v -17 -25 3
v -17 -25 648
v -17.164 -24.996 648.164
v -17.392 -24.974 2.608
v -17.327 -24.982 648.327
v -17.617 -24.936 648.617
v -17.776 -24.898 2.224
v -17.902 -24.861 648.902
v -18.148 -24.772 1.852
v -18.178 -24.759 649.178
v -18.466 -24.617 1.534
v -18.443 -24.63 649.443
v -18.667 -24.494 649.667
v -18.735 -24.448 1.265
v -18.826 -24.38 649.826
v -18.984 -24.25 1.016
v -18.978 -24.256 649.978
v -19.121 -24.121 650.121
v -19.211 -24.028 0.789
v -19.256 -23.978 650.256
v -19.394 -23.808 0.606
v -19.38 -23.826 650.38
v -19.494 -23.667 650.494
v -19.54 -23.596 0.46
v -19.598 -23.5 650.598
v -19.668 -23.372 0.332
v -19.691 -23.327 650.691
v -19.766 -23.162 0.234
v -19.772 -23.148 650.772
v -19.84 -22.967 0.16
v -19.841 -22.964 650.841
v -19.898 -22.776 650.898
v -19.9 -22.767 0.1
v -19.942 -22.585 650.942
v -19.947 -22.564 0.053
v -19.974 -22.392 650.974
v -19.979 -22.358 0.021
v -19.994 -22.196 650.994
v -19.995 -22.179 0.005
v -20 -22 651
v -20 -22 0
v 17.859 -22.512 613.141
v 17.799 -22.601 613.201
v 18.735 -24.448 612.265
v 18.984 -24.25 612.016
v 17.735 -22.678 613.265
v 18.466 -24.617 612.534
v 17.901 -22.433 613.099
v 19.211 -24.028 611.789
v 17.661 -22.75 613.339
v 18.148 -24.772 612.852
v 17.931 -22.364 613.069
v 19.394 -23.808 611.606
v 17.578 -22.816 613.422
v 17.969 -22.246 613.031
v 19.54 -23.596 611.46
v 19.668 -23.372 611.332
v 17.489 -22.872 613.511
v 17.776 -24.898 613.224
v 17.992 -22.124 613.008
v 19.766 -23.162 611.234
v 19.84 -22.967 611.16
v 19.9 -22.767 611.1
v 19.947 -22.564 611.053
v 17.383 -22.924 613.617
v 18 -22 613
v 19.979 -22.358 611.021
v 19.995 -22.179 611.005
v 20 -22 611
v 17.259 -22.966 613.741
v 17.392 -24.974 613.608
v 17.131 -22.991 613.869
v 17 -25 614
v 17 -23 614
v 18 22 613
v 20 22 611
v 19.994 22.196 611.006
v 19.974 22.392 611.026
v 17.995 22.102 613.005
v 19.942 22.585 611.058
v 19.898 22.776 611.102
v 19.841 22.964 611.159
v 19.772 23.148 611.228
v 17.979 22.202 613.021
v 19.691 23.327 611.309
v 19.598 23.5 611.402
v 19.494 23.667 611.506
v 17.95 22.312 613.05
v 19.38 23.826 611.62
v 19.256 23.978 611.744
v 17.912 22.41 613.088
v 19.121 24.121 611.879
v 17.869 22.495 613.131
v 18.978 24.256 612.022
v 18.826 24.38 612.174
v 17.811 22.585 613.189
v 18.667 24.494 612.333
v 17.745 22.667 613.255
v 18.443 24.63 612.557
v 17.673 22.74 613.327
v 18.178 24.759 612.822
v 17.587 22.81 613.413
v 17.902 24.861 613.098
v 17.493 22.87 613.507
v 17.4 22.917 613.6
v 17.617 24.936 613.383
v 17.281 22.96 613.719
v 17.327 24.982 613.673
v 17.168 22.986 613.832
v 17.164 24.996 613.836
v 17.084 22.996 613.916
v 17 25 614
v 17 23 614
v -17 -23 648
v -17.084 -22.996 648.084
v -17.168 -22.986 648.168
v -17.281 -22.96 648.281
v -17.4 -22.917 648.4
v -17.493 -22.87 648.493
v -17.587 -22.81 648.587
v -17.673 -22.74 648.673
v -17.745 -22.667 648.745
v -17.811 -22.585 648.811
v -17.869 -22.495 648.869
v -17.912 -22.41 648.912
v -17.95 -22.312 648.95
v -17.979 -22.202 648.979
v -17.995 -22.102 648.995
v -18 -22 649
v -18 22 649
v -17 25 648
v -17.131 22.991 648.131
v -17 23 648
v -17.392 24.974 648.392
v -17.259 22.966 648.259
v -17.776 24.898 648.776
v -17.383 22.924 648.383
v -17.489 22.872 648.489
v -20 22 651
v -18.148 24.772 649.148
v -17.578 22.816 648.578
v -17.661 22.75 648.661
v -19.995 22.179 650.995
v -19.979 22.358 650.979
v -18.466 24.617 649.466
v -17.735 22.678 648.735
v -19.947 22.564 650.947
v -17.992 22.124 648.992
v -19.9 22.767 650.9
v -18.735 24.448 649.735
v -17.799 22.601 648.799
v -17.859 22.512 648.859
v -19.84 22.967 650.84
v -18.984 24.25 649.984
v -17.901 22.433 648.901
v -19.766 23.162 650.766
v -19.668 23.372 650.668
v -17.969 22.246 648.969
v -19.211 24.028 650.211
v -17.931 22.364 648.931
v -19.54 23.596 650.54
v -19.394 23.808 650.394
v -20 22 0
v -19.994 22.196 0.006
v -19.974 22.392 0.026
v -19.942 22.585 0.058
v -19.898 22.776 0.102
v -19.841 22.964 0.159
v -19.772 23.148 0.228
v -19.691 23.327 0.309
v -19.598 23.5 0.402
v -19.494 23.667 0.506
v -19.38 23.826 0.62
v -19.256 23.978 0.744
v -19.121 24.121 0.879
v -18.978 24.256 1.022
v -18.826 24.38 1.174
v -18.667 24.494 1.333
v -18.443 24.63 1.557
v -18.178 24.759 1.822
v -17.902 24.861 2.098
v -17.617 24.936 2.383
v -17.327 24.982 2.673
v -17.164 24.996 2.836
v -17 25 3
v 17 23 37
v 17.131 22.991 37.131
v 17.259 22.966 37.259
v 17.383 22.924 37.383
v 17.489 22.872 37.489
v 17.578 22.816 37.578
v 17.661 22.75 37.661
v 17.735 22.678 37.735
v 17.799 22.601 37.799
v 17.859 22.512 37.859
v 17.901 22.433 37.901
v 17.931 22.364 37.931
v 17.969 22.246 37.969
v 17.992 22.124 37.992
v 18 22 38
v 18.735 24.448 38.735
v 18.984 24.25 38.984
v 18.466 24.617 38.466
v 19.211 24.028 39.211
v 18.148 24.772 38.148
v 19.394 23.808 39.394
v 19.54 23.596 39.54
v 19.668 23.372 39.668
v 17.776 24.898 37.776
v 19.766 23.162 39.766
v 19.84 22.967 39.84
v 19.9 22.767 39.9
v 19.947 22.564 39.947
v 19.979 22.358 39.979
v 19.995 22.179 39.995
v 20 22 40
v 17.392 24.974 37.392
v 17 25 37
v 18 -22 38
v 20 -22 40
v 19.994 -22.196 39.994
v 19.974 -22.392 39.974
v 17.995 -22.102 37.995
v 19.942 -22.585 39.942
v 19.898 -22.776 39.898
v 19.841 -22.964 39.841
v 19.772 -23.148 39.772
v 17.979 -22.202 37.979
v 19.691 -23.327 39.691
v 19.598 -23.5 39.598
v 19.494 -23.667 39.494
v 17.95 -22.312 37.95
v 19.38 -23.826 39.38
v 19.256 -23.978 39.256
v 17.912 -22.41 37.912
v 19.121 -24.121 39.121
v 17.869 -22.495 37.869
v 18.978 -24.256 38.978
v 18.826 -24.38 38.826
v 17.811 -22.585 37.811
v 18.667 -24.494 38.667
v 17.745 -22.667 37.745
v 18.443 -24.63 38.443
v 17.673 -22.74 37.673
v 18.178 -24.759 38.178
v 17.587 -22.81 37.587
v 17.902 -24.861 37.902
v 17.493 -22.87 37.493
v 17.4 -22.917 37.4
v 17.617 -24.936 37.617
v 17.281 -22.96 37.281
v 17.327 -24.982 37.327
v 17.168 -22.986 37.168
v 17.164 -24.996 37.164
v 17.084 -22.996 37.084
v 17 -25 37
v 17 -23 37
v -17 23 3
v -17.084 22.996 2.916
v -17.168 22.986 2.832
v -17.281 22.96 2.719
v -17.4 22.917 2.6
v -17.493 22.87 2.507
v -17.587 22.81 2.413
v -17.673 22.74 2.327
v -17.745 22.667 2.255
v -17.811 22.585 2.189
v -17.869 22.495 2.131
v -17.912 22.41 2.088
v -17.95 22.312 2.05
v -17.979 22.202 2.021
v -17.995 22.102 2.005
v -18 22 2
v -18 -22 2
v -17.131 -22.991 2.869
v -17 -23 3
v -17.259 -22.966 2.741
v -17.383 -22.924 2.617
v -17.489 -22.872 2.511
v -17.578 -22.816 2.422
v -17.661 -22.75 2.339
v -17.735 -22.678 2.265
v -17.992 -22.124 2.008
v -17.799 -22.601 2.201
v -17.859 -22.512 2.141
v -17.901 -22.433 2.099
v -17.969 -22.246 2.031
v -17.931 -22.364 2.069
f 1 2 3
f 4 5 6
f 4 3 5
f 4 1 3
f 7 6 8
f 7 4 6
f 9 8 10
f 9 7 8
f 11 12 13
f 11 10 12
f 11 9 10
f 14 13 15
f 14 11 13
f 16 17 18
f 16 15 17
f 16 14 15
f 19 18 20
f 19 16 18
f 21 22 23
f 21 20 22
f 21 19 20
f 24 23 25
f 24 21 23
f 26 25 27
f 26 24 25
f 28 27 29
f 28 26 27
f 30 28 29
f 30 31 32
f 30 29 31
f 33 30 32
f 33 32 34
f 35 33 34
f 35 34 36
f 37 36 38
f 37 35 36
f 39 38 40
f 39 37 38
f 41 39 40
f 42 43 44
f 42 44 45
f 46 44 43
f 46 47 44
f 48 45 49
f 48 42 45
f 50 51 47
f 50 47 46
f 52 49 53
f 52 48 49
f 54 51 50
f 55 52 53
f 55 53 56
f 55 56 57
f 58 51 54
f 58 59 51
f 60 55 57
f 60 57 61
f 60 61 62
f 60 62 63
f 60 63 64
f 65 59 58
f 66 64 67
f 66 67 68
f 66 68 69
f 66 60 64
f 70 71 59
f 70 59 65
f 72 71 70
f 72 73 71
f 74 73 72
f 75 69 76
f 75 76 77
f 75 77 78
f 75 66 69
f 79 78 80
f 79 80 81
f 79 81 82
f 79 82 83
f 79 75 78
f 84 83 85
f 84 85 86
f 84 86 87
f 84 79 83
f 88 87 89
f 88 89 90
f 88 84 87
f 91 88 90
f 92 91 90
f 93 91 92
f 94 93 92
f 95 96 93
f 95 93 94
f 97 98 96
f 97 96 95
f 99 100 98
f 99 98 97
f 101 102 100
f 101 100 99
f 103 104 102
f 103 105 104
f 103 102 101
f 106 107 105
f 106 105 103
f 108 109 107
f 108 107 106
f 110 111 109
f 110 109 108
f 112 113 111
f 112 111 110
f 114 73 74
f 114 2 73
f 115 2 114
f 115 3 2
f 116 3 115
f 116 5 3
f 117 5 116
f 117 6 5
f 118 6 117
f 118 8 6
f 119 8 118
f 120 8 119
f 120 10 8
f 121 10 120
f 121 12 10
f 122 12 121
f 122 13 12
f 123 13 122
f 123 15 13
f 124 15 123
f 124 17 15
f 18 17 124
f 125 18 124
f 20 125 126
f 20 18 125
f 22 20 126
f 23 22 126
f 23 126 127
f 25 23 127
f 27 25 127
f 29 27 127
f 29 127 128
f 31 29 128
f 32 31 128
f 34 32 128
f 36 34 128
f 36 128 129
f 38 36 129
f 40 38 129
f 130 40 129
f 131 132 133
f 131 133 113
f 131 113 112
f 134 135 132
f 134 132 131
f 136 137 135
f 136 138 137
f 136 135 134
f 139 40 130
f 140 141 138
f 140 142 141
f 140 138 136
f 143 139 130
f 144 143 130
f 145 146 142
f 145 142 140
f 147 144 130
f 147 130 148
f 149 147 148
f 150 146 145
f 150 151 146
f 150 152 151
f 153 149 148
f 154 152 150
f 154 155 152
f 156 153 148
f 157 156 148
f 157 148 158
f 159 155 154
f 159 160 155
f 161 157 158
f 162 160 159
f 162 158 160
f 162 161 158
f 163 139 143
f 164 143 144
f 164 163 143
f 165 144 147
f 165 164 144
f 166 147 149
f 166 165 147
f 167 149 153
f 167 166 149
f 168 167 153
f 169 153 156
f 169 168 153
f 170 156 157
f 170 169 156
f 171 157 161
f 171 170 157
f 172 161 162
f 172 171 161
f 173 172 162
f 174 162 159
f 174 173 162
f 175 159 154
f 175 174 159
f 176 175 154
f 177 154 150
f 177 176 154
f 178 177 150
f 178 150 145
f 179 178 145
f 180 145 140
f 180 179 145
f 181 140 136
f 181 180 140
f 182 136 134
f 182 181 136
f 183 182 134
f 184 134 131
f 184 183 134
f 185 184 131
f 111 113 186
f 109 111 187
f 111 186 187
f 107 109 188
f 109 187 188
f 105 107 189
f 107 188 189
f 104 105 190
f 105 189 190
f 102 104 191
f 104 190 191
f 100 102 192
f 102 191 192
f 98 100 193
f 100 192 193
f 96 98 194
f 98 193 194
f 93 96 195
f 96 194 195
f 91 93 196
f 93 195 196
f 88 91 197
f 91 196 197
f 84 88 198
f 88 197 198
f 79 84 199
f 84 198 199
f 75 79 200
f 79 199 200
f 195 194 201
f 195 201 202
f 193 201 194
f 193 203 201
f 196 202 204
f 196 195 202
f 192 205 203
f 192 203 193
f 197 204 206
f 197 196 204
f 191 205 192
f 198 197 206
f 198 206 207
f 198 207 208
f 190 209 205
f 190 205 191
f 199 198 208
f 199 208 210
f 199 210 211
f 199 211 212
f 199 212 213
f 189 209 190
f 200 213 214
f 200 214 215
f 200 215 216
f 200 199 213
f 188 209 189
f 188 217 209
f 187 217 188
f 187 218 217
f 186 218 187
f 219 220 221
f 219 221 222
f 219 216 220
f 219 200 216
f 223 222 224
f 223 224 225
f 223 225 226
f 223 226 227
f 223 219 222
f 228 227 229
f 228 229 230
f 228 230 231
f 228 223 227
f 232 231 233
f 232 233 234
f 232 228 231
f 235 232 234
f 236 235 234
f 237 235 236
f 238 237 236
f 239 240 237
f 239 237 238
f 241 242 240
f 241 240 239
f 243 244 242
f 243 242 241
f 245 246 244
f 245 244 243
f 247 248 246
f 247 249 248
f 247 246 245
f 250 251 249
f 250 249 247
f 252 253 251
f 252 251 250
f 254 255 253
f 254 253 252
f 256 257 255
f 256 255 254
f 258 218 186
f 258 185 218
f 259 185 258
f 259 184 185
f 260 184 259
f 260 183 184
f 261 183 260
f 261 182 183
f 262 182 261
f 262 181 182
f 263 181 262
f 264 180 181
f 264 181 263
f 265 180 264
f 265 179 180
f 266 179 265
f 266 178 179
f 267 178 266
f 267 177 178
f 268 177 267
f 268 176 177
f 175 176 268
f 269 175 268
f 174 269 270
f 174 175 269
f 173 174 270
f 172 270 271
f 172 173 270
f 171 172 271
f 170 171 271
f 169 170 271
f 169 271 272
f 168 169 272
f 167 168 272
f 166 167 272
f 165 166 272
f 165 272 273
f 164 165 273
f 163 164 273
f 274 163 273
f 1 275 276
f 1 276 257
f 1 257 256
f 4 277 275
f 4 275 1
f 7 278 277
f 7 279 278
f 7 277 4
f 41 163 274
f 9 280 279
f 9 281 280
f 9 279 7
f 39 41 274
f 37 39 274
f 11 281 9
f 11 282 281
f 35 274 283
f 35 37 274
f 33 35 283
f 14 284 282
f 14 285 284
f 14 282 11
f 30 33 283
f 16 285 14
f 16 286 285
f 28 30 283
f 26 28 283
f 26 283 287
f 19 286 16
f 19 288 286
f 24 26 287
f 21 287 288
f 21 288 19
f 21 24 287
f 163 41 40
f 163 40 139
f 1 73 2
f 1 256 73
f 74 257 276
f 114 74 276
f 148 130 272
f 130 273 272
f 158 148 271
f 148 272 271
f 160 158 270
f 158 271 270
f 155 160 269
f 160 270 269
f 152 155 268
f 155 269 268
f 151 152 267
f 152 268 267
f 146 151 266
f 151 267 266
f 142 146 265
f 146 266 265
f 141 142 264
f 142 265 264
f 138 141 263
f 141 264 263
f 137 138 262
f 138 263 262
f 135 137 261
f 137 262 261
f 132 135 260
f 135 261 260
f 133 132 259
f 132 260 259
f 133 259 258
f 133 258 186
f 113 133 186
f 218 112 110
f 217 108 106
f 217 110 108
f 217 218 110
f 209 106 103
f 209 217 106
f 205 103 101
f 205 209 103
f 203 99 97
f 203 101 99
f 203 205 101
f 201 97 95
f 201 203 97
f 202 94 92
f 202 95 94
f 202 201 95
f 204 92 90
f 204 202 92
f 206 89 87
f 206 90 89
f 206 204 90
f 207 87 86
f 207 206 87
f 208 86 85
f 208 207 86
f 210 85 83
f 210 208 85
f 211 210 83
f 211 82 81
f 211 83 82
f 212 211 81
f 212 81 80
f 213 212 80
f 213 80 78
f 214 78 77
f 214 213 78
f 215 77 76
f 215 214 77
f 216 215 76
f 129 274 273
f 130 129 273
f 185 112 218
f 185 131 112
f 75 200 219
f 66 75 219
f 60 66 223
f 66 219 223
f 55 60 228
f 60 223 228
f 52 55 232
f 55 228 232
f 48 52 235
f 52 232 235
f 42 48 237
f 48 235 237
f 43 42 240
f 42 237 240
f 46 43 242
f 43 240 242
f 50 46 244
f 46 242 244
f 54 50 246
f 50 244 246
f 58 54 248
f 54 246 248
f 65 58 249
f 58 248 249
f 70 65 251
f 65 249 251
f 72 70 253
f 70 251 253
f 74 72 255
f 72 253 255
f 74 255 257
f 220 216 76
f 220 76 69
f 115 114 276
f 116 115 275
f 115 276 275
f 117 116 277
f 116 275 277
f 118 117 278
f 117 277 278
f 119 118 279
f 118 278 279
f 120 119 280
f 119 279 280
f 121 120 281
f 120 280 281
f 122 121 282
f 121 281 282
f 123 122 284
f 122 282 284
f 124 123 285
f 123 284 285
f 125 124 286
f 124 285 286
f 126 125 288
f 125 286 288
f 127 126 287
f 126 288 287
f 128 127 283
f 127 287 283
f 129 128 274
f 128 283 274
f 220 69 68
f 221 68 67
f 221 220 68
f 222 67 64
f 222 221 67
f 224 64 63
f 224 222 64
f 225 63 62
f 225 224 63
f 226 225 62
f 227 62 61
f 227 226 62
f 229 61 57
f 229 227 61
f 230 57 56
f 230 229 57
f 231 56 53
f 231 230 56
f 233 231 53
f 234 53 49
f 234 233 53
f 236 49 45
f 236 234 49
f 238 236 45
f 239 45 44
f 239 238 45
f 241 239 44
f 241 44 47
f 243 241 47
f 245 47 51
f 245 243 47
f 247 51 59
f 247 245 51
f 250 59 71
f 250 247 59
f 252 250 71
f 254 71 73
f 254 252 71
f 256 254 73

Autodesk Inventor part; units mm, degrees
ref_plane "Start plane" through (0, 0, 0) normal (0, 0, 1) x (1, 0, 0)
ref_plane "End plane" through (0, 0, 651) normal (0, 0, 1) x (1, 0, 0)
sketch "Sketch" plane through (0, 0, 0) normal (0, 0, 1) x (1, 0, 0)
  line L0 (-20, -22) -> (-20, 22)
  line L1 (-17, 25) -> (17, 25)
  line L2 (20, 22) -> (20, -22)
  line L3 (17, -25) -> (-17, -25)
  arc A0 (-20, -22) -> (-17, -25) centre (-17, -22) ccw
  arc A1 (-17, 25) -> (-20, 22) centre (-17, 22) ccw
  arc A2 (20, 22) -> (17, 25) centre (17, 22) ccw
  arc A3 (17, -25) -> (20, -22) centre (17, -22) ccw
  arc A4 (-17, 23) -> (-18, 22) centre (-17, 22) ccw
  line L4 (-17, 23) -> (17, 23)
  arc A5 (18, 22) -> (17, 23) centre (17, 22) ccw
  line L5 (18, 22) -> (18, -22)
  arc A6 (17, -23) -> (18, -22) centre (17, -22) ccw
  line L6 (17, -23) -> (-17, -23)
  arc A7 (-18, -22) -> (-17, -23) centre (-17, -22) ccw
  line L7 (-18, -22) -> (-18, 22)
  line L8 (0, 35.8698) -> (0, -35.8698) construction
  line L9 (-28.8698, 0) -> (28.8698, 0) construction
  dimension "d7" = 3
  dimension "d10" = 50
  dimension "d11" = 40
  dimension "d12" = 2
  dimension "d15" = 25
  dimension "d16" = 20
extrude "Body" add sketch "Sketch" along normal up to surface (651 mm away) from surface at 0
sketch "Sketch3" plane through (0, 0, 0) normal (0, 0, 1) x (1, 0, 0)
  line L0 (0, 0) -> (10, 0)
ref_plane "Work Plane3" through (0, 0, 0) normal (0, -1, 0) x (1, 0, 0)
sketch "Sketch4" plane through (0, 0, 0) normal (0, -1, 0) x (1, 0, 0)
  line L0 (-2, 0) -> (12, 0)
  line L1 (-2, 651) -> (12, 651)
  dimension "d18" = 651
ref_plane "Work Plane4" through (-20, 0, 0) normal (0.7071, 0, -0.7071) x (-0.7071, 0, -0.7071)
split "Split1" plane through (-20, 0, 0) removes the side toward (0.7071, 0, -0.7071)
ref_plane "Work Plane5" through (-20, 0, 651) normal (0.7071, 0, 0.7071) x (0.7071, 0, -0.7071)
split "Split2" plane through (-20, 0, 651) removes the side toward (0.7071, 0, 0.7071)
equation "\"d7\" = G_IR"
equation "\"d10\" = G_H"
equation "\"d11\" = G_W"
equation "\"d12\" = G_T"
equation "\"d15\" = 0.5 * d10"
equation "\"d16\" = 0.5 * d11"
equation "\"d3\" = G_L"
equation "\"G_W\" = 40"
equation "\"G_H\" = 50"
equation "\"G_T\" = 2"
equation "\"G_IR\" = 3"
equation "\"G_L\" = d18"
equation "\"G_OFFSET_START\" = 0"
equation "\"G_OFFSET_END\" = 0"
equation "\"d14\" = G_OFFSET_END + B_L"
equation "\"B_L\" = 651"
properties part number "UNI EN 10305-5 - 50 x 40 x 2  - 651" material "Steel, Mild"
